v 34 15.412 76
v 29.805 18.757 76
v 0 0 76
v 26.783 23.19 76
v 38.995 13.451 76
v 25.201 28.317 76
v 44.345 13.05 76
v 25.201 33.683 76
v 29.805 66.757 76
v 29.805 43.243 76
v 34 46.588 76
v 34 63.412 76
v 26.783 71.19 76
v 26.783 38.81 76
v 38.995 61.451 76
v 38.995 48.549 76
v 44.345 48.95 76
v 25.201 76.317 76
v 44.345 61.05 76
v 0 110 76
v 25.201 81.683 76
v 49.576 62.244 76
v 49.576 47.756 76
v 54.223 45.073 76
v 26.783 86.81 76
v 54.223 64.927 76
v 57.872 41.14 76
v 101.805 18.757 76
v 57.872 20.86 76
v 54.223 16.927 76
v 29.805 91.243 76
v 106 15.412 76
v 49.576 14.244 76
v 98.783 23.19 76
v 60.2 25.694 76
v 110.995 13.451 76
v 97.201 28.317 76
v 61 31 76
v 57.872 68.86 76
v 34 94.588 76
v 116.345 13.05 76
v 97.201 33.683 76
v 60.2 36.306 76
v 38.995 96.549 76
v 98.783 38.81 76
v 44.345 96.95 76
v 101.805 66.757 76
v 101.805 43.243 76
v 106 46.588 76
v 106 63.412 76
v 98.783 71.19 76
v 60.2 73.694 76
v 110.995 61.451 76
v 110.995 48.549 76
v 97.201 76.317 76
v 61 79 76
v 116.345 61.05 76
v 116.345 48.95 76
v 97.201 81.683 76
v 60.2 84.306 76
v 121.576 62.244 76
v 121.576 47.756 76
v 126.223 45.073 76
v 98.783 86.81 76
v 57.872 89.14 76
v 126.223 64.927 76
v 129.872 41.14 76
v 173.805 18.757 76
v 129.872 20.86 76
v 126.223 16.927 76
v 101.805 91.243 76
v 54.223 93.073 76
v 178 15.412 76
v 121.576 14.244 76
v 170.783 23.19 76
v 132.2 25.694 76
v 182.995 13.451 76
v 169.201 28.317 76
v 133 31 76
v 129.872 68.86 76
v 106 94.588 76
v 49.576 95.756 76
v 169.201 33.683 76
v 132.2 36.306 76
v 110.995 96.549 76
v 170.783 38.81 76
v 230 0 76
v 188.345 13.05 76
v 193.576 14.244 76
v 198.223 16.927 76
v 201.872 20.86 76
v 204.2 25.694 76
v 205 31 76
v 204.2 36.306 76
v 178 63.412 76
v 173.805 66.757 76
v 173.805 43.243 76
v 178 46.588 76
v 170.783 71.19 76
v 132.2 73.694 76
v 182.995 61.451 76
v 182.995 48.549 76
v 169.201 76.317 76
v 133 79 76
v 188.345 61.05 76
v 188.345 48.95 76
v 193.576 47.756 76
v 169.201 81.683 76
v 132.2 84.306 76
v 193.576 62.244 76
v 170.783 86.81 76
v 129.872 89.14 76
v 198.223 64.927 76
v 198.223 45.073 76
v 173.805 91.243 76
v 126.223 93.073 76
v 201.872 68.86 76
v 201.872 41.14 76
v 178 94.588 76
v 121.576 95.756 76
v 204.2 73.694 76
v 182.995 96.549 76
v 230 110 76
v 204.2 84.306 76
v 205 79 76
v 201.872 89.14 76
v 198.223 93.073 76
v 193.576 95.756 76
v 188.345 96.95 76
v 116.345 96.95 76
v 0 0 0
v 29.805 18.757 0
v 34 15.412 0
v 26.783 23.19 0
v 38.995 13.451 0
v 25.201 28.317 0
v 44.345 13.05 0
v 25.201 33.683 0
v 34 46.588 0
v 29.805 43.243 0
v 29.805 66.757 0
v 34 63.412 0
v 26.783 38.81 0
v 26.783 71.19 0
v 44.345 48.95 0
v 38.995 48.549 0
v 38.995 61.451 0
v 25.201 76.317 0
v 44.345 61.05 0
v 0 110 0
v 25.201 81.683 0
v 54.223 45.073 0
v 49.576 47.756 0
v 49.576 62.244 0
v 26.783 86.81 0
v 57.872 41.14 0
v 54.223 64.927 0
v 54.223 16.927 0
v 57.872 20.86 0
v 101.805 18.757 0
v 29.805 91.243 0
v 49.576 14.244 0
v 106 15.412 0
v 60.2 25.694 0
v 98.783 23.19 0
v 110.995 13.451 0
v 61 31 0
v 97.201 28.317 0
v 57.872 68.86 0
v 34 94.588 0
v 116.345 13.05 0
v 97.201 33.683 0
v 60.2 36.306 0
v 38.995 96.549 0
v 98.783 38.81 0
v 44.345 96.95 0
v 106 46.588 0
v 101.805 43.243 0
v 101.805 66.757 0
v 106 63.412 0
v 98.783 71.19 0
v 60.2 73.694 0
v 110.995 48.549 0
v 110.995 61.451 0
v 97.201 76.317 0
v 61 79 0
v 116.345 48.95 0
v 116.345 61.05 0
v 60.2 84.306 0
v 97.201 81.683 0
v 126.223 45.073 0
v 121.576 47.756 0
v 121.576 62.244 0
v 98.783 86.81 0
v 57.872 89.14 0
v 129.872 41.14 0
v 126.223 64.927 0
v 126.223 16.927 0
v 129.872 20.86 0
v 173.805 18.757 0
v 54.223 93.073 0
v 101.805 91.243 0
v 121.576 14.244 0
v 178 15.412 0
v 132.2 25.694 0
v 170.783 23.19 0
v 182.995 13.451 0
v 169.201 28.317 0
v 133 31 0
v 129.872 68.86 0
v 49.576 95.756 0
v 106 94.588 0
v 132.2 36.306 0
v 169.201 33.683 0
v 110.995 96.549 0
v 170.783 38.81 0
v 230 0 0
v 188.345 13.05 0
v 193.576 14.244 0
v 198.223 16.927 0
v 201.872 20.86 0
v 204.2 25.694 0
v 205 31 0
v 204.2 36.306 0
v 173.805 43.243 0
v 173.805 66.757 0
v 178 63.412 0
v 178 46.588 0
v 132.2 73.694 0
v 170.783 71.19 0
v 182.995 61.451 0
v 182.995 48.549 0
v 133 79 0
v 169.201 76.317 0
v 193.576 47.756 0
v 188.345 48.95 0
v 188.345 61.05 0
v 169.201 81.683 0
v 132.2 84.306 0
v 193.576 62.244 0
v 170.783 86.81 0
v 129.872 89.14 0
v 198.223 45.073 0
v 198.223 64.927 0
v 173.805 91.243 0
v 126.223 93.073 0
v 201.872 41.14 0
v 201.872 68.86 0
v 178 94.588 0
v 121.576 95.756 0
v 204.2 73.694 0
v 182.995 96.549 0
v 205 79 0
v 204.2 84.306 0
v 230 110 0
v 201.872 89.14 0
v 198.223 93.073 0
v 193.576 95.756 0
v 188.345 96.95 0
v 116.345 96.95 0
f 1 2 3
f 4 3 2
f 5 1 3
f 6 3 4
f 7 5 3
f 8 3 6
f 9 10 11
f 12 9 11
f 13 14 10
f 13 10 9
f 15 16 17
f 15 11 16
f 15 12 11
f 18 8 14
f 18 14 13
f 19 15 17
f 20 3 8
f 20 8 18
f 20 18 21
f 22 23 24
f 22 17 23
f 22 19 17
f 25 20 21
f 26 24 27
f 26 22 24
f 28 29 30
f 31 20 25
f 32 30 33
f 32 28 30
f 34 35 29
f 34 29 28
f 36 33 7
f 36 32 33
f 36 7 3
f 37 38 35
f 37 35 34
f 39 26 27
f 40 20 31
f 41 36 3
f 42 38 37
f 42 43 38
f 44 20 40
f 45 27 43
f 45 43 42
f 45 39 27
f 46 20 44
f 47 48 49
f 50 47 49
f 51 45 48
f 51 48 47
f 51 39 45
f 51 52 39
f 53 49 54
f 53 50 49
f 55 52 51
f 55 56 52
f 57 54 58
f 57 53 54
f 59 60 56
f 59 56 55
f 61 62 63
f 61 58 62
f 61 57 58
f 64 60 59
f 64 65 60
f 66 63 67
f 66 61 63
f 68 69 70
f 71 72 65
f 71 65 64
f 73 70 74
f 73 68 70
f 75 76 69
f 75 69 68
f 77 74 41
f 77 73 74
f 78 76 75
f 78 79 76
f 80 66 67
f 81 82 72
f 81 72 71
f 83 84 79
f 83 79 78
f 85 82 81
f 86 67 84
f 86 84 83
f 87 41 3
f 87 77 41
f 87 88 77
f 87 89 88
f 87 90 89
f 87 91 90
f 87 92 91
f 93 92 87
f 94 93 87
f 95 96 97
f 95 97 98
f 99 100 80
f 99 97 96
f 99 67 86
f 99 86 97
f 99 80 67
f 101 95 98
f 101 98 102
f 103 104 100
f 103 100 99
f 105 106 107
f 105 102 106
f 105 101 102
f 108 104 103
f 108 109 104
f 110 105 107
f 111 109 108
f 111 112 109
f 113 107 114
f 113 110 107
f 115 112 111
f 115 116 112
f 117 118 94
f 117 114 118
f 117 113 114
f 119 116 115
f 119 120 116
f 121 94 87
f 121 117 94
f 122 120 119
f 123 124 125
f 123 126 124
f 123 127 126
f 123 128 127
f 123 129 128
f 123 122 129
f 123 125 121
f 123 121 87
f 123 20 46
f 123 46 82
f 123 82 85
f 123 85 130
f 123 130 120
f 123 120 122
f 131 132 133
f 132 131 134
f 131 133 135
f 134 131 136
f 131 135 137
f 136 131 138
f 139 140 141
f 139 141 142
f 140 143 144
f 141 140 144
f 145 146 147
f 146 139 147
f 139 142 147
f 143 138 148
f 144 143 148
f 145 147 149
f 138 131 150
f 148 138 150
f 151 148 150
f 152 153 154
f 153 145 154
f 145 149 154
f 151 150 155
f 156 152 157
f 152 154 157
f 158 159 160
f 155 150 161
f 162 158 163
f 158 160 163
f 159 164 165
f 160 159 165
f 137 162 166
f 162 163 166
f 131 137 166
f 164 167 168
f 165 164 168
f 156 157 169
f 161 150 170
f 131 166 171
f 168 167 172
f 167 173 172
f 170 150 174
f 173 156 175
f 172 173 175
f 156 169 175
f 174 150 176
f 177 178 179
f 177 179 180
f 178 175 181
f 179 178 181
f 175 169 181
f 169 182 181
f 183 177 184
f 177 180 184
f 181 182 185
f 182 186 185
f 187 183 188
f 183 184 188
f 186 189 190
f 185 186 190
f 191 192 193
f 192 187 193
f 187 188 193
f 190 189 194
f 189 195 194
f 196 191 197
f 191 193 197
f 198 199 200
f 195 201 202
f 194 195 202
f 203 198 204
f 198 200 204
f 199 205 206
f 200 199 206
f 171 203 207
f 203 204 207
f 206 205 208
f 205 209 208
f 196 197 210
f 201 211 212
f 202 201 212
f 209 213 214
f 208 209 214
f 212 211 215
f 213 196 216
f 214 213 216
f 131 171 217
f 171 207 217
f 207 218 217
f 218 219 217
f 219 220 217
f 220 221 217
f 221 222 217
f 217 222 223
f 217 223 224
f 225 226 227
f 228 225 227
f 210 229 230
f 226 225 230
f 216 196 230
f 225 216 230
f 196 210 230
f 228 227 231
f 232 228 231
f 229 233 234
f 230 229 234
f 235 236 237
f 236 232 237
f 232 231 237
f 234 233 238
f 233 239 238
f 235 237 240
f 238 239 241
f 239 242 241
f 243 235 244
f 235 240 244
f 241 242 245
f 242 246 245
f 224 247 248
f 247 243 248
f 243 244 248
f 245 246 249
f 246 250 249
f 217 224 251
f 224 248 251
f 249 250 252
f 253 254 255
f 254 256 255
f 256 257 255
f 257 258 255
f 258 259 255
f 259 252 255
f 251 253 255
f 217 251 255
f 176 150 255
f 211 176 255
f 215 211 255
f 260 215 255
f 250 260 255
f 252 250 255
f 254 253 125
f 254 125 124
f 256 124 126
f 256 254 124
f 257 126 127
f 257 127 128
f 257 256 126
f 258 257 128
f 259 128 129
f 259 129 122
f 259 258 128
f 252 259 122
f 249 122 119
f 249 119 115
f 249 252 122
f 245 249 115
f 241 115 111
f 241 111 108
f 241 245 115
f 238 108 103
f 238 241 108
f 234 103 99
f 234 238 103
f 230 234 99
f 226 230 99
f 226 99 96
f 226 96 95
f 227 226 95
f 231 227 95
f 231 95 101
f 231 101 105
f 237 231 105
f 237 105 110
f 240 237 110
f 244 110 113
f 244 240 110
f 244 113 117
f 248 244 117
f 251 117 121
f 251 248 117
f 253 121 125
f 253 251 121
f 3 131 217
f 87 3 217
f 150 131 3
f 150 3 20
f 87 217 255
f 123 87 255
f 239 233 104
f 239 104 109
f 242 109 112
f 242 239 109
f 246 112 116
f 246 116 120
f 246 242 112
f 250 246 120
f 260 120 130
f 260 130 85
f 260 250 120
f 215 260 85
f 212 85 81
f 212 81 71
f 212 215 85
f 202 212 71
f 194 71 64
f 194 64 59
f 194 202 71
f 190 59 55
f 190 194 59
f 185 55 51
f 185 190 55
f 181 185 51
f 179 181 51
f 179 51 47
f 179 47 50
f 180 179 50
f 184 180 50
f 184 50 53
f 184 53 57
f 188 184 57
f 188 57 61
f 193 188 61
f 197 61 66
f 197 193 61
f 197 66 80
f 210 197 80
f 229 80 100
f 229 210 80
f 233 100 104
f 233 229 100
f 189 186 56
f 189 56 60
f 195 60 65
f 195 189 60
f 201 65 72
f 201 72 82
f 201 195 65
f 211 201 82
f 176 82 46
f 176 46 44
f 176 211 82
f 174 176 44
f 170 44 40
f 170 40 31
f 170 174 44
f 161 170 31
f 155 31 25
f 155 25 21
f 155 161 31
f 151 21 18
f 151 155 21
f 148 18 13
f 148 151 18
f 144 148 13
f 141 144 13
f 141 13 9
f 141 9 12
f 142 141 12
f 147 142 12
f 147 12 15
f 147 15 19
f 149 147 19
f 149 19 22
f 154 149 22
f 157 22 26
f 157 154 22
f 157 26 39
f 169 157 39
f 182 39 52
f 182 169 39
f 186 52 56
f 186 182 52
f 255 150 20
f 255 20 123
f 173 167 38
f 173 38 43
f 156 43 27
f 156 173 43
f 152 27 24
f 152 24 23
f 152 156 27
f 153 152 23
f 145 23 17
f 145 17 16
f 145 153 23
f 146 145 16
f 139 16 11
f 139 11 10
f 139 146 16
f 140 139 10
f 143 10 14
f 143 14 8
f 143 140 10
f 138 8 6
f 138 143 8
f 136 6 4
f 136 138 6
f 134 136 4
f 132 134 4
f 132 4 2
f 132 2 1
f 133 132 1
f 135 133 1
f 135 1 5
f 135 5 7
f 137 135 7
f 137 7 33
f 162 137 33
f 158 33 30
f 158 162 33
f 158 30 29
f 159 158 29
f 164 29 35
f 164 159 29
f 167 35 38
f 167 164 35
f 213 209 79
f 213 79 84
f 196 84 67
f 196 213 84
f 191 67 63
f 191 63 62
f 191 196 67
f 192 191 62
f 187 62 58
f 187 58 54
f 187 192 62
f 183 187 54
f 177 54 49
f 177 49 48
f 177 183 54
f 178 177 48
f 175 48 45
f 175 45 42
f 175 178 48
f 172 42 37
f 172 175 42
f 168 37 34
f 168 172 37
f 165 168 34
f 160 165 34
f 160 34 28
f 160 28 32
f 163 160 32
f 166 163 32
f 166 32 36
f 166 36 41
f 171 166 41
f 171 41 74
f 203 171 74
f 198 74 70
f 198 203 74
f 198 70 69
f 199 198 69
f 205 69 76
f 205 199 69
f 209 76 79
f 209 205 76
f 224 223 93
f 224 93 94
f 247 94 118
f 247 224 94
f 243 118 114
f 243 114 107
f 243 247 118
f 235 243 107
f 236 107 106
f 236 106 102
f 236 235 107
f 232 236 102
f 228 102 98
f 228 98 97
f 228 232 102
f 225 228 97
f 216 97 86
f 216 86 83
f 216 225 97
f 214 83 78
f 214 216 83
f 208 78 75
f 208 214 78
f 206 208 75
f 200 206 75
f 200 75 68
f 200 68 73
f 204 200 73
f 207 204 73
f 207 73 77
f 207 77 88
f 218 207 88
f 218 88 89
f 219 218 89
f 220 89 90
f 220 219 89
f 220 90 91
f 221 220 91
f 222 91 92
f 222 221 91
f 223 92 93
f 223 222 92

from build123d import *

# Parameters (mm, degrees)
CYLINDER002_R     = 18
CYLINDER002_DEPTH = 76
CYLINDER003_R     = 18
CYLINDER003_DEPTH = 76
CYLINDER004_R     = 18
CYLINDER004_DEPTH = 76
CYLINDER005_R     = 18
CYLINDER005_DEPTH = 76
CYLINDER_R        = 18
CYLINDER_DEPTH    = 76
CYLINDER001_R     = 18
CYLINDER001_DEPTH = 76
BOX_W             = 230
BOX_H             = 110
BOX_DEPTH         = 76


with BuildPart() as cilindro002:
    # Cylinder002 → Cylinder002 (new body)
    with BuildSketch(Plane(origin=(43, 31, 0), x_dir=(1, 0, 0), z_dir=(0, 0, 1))):
        Circle(CYLINDER002_R)
    extrude(amount=CYLINDER002_DEPTH)


with BuildPart() as fusion001:
    # Cylinder003 → Cylinder003 (new body)
    with BuildSketch(Plane(origin=(43, 79, 0), x_dir=(1, 0, 0), z_dir=(0, 0, 1))):
        Circle(CYLINDER003_R)
    extrude(amount=CYLINDER003_DEPTH)

    # Fusion001: union Cilindro002
    add(cilindro002.part)


with BuildPart() as fusion001_1:
    # Fusion001 placement: moved
    add(fusion001.part.moved(Location((72, 0, 0))))


with BuildPart() as cilindro004:
    # Cylinder004 → Cylinder004 (new body)
    with BuildSketch(Plane(origin=(43, 31, 0), x_dir=(1, 0, 0), z_dir=(0, 0, 1))):
        Circle(CYLINDER004_R)
    extrude(amount=CYLINDER004_DEPTH)


with BuildPart() as fusion002:
    # Cylinder005 → Cylinder005 (new body)
    with BuildSketch(Plane(origin=(43, 79, 0), x_dir=(1, 0, 0), z_dir=(0, 0, 1))):
        Circle(CYLINDER005_R)
    extrude(amount=CYLINDER005_DEPTH)

    # Fusion002: union Cilindro004
    add(cilindro004.part)


with BuildPart() as fusion002_1:
    # Fusion002 placement: moved
    add(fusion002.part.moved(Location((144, 0, 0))))


with BuildPart() as cilindro:
    # Cylinder → Cylinder (new body)
    with BuildSketch(Plane(origin=(43, 31, 0), x_dir=(1, 0, 0), z_dir=(0, 0, 1))):
        Circle(CYLINDER_R)
    extrude(amount=CYLINDER_DEPTH)


with BuildPart() as fusion:
    # Cylinder001 → Cylinder001 (new body)
    with BuildSketch(Plane(origin=(43, 79, 0), x_dir=(1, 0, 0), z_dir=(0, 0, 1))):
        Circle(CYLINDER001_R)
    extrude(amount=CYLINDER001_DEPTH)

    # Fusion: union Cilindro
    add(cilindro.part)


with BuildPart() as cut002:
    # Box → Box (new body)
    with BuildSketch(Plane.XY):
        with Locations((115, 55)):
            Rectangle(BOX_W, BOX_H)
    extrude(amount=BOX_DEPTH)

    # Cut: cut Fusion
    add(fusion.part, mode=Mode.SUBTRACT)

    # Cut001: cut Fusion002
    add(fusion002_1.part, mode=Mode.SUBTRACT)

    # Cut002: cut Fusion001
    add(fusion001_1.part, mode=Mode.SUBTRACT)


solid = cut002.part
